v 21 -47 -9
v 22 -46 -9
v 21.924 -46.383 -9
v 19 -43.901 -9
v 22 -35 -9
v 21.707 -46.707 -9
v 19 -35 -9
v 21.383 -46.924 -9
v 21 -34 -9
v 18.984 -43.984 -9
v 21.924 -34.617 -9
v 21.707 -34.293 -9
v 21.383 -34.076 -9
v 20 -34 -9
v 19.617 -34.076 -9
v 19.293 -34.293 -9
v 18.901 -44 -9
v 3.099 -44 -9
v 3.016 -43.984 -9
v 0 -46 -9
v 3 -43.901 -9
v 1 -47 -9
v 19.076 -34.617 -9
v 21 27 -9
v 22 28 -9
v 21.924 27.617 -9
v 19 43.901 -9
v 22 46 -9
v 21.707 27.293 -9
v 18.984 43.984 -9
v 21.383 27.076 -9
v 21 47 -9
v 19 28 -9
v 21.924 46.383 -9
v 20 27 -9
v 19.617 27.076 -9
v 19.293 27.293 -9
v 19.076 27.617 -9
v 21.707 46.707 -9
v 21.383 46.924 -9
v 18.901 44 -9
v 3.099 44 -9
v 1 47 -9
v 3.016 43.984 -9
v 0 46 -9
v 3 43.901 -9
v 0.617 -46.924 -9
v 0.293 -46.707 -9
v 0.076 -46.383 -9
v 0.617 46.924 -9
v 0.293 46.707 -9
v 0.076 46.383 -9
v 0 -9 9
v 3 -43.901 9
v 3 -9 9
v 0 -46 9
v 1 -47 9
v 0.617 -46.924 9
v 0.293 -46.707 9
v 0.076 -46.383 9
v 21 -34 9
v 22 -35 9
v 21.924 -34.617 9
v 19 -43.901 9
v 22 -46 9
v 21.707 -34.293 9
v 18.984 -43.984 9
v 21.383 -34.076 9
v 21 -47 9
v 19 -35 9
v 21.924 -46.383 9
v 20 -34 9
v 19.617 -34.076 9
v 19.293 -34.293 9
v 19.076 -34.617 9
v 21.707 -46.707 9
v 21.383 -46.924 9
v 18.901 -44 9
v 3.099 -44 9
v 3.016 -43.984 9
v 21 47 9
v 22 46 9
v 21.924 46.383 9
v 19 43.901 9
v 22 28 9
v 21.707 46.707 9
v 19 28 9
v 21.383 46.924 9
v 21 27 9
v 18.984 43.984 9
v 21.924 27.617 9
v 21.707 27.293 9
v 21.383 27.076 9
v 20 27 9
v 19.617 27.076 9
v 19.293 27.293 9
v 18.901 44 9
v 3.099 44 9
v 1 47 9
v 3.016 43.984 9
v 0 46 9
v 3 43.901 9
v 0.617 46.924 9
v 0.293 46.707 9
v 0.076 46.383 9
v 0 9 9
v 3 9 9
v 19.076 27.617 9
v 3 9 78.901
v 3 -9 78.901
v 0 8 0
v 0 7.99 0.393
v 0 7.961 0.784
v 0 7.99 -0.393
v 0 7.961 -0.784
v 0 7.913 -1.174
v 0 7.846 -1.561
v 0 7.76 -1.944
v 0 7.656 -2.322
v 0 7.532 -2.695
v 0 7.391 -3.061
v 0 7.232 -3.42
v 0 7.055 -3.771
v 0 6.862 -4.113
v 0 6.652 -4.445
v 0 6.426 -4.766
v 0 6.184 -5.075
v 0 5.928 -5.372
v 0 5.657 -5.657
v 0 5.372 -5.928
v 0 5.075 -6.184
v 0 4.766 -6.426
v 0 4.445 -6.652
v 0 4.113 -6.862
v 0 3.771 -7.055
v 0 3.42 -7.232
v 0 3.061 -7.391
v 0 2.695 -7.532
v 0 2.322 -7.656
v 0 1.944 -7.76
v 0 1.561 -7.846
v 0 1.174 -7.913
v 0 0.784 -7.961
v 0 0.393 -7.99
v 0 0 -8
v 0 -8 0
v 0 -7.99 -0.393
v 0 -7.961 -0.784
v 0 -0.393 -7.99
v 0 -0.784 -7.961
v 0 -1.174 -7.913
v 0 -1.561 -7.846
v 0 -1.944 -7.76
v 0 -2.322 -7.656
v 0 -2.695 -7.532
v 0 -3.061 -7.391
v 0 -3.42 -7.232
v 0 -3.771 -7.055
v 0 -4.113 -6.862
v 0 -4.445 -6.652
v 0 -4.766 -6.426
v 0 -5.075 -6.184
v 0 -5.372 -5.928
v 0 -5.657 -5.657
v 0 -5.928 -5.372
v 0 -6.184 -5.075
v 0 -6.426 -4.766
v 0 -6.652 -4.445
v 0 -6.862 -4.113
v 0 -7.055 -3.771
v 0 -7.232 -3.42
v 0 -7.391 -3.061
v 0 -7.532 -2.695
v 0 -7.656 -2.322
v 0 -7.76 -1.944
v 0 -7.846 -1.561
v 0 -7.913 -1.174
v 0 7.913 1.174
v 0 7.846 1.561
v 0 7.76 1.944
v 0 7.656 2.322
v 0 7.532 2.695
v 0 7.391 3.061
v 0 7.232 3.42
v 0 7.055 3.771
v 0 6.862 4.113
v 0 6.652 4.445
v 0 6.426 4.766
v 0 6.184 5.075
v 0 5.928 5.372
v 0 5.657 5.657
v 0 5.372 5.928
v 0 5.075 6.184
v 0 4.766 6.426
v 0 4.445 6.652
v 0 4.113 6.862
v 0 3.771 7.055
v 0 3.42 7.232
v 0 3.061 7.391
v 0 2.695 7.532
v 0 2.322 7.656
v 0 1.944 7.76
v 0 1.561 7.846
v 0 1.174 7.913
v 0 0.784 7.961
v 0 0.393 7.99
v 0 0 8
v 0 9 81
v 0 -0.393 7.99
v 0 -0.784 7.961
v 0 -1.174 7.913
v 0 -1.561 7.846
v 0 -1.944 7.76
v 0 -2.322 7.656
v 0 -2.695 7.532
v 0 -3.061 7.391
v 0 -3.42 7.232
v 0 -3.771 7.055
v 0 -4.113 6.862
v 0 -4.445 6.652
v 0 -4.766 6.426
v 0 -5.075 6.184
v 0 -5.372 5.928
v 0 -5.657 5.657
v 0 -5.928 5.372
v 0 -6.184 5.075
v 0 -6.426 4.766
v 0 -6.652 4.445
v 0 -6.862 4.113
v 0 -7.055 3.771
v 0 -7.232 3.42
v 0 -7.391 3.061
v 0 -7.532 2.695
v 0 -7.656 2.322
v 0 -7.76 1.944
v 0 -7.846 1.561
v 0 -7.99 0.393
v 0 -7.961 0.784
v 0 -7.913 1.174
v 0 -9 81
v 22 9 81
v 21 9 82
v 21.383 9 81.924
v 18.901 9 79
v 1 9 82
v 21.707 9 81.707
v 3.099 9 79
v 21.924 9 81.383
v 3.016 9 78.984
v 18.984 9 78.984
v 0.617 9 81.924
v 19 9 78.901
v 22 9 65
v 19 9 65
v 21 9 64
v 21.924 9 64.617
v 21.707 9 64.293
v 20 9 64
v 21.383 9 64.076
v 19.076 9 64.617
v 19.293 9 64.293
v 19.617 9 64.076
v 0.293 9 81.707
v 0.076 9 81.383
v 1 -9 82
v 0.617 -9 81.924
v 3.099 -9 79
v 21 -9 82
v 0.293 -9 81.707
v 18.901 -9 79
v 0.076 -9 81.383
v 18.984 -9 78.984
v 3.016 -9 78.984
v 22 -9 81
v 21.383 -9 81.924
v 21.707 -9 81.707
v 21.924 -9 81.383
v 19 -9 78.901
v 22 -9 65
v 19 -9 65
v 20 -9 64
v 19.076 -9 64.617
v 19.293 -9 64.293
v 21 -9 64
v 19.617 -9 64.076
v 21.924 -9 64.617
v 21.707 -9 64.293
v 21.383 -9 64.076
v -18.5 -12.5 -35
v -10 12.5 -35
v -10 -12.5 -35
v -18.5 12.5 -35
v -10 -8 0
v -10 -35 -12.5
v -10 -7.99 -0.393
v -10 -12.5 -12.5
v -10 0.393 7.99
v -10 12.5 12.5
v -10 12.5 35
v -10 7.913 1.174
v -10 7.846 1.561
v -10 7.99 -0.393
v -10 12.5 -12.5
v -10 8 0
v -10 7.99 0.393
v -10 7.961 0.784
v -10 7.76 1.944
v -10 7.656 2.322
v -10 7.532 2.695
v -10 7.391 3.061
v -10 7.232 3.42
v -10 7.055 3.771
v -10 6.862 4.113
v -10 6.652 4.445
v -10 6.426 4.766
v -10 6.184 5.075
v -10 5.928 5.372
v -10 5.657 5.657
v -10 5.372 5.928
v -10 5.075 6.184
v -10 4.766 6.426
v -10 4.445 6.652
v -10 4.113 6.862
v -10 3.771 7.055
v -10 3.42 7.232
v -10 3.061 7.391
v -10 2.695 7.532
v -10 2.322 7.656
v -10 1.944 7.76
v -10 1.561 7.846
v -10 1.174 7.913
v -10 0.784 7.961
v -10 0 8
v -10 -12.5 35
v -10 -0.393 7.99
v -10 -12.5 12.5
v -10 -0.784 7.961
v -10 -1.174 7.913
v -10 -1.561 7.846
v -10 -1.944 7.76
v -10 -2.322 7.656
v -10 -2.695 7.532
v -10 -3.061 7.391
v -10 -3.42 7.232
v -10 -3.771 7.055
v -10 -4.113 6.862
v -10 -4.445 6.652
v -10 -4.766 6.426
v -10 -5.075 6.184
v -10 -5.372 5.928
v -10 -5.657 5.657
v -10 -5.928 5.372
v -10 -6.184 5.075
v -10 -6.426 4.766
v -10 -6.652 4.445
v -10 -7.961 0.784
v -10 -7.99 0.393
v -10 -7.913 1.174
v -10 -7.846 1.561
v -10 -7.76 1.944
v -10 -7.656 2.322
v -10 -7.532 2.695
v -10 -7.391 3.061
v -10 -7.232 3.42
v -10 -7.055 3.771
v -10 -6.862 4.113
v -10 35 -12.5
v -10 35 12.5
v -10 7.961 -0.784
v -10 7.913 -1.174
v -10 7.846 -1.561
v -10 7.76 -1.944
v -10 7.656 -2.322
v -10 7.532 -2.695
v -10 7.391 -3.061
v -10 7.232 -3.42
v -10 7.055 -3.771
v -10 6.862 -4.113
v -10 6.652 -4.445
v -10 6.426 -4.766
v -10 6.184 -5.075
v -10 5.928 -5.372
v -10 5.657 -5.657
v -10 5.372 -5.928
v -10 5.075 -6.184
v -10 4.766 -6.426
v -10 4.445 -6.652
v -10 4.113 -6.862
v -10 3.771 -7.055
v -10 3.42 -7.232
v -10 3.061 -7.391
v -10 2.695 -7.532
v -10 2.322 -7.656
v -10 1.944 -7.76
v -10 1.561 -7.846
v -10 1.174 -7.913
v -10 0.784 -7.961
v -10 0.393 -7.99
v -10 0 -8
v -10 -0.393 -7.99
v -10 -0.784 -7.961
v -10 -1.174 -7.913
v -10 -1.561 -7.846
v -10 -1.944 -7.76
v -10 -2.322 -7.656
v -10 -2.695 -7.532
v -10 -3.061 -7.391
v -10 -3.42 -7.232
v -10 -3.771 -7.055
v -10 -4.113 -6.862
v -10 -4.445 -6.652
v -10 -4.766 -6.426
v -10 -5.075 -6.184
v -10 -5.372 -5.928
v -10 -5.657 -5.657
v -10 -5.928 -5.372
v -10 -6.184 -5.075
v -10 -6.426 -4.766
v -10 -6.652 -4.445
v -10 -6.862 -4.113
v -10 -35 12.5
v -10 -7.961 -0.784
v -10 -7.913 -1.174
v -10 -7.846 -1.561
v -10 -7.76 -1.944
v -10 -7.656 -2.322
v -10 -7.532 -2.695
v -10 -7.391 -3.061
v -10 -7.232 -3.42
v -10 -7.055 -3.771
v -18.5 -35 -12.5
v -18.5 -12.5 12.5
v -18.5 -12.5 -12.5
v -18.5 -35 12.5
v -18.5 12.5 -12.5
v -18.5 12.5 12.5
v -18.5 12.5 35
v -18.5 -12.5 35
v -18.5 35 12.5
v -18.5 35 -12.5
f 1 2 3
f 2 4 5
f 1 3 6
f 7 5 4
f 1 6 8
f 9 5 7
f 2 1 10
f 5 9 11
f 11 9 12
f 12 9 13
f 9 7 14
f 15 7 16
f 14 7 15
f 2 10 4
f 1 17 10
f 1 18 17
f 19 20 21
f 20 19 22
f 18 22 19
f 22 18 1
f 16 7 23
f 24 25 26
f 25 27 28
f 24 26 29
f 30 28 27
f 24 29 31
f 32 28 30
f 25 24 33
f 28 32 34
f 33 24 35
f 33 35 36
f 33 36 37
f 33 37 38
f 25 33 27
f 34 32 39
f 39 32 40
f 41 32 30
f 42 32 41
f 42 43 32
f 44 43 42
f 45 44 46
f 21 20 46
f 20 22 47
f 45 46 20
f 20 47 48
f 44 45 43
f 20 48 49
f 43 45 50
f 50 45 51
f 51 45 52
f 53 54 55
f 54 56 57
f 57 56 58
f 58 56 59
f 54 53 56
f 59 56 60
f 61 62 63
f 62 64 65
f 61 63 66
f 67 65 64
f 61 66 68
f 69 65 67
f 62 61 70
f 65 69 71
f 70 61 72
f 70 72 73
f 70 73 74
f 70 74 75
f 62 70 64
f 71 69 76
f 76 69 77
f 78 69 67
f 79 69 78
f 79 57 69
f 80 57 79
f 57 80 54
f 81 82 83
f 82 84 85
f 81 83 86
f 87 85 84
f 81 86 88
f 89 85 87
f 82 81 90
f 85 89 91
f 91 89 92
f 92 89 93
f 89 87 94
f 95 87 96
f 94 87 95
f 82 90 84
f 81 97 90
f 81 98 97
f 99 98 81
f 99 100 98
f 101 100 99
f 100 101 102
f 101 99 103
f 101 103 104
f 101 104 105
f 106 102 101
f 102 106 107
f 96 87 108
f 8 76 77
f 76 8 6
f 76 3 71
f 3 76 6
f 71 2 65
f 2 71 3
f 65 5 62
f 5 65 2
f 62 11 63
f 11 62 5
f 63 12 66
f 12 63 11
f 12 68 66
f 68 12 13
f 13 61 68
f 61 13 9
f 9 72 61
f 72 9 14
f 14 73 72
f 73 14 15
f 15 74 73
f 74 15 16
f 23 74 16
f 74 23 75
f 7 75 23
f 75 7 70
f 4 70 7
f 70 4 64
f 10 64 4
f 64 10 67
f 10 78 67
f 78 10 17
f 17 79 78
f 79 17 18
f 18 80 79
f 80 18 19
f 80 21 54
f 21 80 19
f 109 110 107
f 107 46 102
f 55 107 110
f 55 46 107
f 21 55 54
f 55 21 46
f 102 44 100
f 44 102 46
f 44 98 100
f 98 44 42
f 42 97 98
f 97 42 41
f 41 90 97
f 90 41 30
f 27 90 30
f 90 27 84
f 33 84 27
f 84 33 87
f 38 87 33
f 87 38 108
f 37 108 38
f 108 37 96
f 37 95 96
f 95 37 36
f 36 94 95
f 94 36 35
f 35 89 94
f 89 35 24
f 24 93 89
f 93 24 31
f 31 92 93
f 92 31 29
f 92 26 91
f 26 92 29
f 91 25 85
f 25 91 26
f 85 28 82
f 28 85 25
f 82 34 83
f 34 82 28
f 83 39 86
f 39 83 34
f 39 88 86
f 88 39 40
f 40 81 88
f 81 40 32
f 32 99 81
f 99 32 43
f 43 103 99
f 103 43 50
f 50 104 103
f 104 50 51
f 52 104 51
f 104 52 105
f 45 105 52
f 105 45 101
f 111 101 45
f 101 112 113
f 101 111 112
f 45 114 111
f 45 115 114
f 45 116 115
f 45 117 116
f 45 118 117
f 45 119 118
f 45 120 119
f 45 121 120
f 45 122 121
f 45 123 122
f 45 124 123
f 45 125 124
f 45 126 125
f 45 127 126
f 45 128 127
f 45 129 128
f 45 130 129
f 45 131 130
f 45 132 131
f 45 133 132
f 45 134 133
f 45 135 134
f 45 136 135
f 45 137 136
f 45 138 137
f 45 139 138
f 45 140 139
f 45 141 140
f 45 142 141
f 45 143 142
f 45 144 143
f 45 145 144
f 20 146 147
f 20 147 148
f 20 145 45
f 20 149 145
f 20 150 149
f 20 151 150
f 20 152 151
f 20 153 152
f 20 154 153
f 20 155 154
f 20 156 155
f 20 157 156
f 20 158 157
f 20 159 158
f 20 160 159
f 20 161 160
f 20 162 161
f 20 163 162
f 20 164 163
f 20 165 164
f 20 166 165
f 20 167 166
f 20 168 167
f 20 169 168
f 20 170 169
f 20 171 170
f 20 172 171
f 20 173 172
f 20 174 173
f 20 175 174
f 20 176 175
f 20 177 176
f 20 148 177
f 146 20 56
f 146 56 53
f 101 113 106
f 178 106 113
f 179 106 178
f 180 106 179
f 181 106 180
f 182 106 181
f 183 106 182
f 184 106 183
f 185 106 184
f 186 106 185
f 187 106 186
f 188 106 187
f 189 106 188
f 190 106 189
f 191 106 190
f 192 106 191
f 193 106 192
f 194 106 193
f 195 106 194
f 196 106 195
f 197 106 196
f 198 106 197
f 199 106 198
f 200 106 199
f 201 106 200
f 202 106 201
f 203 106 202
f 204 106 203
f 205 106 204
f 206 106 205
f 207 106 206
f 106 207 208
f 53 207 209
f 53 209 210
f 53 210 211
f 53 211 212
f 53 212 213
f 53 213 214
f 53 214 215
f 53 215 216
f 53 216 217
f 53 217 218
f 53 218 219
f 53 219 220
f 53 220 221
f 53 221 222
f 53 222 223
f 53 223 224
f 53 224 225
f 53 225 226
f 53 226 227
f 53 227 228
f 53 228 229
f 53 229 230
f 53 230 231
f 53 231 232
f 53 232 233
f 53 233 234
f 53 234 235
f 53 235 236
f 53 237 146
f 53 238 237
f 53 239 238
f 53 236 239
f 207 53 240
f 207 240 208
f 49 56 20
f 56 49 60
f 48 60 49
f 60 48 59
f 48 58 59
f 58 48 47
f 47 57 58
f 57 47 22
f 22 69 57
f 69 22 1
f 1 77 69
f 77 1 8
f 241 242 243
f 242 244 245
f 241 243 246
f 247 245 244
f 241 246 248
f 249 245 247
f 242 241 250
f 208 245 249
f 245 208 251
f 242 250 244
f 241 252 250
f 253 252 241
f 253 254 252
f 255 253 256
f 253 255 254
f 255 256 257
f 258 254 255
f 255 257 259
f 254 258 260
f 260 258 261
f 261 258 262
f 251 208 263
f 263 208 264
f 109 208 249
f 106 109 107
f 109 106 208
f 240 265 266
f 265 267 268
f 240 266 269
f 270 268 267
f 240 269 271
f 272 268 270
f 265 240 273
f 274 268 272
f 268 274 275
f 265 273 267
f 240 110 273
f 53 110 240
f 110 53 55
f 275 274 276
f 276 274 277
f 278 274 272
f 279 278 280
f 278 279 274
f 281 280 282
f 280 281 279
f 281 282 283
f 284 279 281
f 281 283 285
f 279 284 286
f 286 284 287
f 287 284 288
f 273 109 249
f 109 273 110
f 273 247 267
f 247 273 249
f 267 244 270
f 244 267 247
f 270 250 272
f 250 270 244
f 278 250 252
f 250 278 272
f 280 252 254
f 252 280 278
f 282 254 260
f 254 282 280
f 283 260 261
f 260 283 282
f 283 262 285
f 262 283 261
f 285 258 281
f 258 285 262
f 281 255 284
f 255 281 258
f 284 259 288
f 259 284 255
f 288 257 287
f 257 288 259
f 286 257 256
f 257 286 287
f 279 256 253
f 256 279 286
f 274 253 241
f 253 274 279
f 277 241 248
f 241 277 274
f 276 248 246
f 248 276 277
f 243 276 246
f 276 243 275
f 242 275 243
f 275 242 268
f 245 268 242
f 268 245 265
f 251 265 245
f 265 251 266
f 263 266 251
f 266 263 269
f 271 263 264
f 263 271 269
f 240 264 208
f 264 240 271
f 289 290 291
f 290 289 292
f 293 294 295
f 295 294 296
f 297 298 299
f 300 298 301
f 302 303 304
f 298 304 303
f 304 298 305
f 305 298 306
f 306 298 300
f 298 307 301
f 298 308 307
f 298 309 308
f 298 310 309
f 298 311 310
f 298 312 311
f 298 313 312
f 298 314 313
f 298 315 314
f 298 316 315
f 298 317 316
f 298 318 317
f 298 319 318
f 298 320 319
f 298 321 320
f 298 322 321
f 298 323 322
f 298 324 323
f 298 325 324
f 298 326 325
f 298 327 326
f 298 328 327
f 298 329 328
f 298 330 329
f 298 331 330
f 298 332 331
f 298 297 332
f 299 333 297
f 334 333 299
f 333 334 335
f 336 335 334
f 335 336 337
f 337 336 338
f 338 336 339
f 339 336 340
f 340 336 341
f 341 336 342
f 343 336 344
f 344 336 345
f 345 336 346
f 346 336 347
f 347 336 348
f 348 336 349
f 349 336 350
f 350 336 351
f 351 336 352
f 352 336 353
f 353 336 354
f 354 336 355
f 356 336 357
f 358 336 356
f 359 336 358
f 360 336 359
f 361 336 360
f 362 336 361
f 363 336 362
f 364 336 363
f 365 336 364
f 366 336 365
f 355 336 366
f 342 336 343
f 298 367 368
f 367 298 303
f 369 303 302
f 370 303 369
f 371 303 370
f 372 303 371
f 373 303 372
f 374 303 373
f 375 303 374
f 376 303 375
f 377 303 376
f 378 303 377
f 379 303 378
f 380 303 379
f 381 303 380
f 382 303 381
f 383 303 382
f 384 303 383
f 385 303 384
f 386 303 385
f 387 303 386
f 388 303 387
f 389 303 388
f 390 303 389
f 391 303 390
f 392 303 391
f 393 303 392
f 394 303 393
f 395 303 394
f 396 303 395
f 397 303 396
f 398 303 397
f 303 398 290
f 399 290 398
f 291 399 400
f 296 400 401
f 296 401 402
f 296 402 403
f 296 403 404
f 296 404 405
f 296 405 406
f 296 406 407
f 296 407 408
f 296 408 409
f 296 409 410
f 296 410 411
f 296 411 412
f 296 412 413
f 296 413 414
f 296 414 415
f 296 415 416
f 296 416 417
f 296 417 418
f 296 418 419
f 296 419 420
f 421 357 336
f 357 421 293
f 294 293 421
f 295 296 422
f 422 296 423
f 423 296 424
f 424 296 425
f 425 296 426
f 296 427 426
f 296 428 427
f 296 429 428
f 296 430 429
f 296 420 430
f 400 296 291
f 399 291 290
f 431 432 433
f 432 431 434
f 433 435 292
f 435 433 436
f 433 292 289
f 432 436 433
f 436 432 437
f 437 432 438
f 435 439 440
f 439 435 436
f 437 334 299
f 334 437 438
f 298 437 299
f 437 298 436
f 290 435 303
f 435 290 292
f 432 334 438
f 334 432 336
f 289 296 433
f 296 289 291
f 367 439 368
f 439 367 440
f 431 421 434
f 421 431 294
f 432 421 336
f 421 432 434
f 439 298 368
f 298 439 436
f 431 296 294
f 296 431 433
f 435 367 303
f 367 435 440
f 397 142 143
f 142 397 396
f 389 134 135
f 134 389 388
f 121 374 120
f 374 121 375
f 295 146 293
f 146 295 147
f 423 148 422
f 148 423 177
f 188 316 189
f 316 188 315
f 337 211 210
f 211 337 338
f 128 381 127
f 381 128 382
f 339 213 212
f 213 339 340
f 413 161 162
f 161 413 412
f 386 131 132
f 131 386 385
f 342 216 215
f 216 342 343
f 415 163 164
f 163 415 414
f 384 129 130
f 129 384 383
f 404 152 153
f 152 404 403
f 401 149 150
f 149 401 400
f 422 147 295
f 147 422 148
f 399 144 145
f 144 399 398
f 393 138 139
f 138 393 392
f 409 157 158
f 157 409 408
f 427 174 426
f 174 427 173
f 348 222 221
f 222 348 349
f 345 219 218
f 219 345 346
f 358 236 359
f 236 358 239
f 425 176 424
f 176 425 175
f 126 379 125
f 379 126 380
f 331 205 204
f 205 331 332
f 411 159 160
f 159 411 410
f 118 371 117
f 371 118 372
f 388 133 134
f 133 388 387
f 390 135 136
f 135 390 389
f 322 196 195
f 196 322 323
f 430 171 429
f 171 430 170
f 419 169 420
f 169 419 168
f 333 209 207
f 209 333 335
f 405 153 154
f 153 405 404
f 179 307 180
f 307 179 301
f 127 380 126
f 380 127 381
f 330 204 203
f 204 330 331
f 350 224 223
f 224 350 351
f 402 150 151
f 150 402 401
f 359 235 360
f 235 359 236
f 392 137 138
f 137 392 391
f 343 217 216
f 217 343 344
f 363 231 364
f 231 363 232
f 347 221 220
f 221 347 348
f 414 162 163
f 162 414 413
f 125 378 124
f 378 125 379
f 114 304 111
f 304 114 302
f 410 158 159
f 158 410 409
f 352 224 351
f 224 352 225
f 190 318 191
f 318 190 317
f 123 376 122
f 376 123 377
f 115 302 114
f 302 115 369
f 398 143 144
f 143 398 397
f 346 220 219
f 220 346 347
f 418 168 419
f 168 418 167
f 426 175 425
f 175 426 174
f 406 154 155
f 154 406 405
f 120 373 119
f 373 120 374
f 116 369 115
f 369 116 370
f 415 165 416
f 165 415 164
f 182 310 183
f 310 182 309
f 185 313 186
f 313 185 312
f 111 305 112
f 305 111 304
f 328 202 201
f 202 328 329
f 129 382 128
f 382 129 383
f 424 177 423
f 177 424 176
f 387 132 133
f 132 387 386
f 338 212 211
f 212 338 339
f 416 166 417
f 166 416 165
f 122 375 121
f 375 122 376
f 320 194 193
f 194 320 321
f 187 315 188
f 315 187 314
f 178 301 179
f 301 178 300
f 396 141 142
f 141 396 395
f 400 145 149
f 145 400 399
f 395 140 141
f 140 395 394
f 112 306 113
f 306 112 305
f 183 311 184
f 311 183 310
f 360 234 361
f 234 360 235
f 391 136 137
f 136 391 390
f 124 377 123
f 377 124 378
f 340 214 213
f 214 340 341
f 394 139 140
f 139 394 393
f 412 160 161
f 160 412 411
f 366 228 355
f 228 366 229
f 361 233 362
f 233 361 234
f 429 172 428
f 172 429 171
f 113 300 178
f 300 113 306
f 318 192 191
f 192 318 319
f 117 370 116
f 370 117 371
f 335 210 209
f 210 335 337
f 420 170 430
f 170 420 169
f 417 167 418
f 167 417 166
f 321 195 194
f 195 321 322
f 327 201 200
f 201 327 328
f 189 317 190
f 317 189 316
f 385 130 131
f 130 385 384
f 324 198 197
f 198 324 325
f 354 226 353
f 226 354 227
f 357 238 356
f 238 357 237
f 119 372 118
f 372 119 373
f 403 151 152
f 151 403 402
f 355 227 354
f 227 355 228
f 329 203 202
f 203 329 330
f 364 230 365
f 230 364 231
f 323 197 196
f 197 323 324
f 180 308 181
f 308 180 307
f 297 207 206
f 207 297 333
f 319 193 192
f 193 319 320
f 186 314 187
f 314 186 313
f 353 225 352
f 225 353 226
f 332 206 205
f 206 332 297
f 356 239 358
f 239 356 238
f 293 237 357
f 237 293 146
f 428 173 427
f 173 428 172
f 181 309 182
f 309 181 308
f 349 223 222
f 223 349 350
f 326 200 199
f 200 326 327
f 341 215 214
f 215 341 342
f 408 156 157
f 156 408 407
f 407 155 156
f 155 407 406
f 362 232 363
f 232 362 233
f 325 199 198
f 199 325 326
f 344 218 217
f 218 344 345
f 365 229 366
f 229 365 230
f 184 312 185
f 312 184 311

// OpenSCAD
// file: A2D.scad
// Wrapper entrypoint for A2D (doc-friendly: include <A2D.scad>)
include <A2D/A2D.scad>;
// main file
// Animace
$vpt = [0, 0, 0]; // Kam se hledí
// $vpr = [270, 0, 270]; // Úhel kamery
// $t = 0.0-1.0; // Čas
$vpd = 500; // Vzdálenost od objektu
//$t = 0.0;  => $vpr = [270, 0, 270];
//$t = 0.25; => $vpr = [220, 0, 180];
//$t = 0.5;  => $vpr = [270, 0,  90];
//$t = 0.75; => $vpr = [320, 0,   0];
//$t = 1.0;  => $vpr = [270, 0, -90];
//$t = 0.5;
//$vpr = [270, 0, 360*$t-90];
$vpr = [270-50*sin($t*360), 0, 270-$t*4*90];




include <A2D.scad>;

// Rozměry pro mobil (pro držák, aby se do něj vešel)
mobilTloustka = 16;
mobilSirka = 88;
mobilVyskaPul = 88; // odspoda k prvnímu tlačítku

// Rozměry přesahů u držáku
paclikSirka = 18;
paclikPresahPravy = 10; // Tam co jsou tlačítka
paclikPresahLevy = 17; // Tam co je tužka
paclikPresahDolni = 15; // Tam co je tužka
paclikTloustka = 3;
// Cnější a vnitřní zaoblení držákové části
ro=1.0;
ri=0.0;

// Deska (křížek +) pro přichycení na selfie tyč
deskaVyska = 70;
deskaSirka = 25;
deskaTloustka = 8.5;

// Spojnice mezi deskou (křížkem) a držákem mobilu
spojD = 16;
spojH = 10;

// Držáková část pro uchycení mobilu
module Drzak()
{
    linear_extrude(paclikSirka, center=true) {
        make_round(ro=ro, ri=ri, $fn=16) 
        polygon([
            [0,0], // 1
            [2*paclikTloustka+mobilTloustka, 0], // 2
            [2*paclikTloustka+mobilTloustka, paclikTloustka+paclikPresahPravy], //3
            [paclikTloustka+mobilTloustka, paclikTloustka+paclikPresahPravy], // 4
            [paclikTloustka+mobilTloustka, paclikTloustka], // 5
            [paclikTloustka, paclikTloustka], // 6
            [paclikTloustka, paclikTloustka+mobilSirka], // 7
            [paclikTloustka+mobilTloustka, paclikTloustka+mobilSirka], // 8
            [paclikTloustka+mobilTloustka, paclikTloustka+mobilSirka-paclikPresahLevy], // 9
            [2*paclikTloustka+mobilTloustka, paclikTloustka+mobilSirka-paclikPresahLevy], // 10
            [2*paclikTloustka+mobilTloustka, 2*paclikTloustka+mobilSirka], // 11
            [0, 2*paclikTloustka+mobilSirka], // 12
        ]);
    }
    translate([0,(mobilSirka+2*paclikTloustka)/2,-paclikSirka/2])
    rotate([90,0,0])
    linear_extrude(paclikSirka, center=true) {
        make_round(ro=ro, ri=ri, $fn=16) 
        polygon([
            [0,0], // 1
            [paclikTloustka, 0], // 2
            [paclikTloustka, mobilVyskaPul], // 3
            [paclikTloustka+mobilTloustka, mobilVyskaPul], // 4
            [paclikTloustka+mobilTloustka, mobilVyskaPul-paclikPresahDolni], // 5
            [2*paclikTloustka+mobilTloustka, mobilVyskaPul-paclikPresahDolni], // 6
            [2*paclikTloustka+mobilTloustka, mobilVyskaPul+paclikTloustka], // 7
            [0, mobilVyskaPul+paclikTloustka], // 8
        ]);
    }
}

// Zadní deska (křížek) pro uchycení do selfie tyče
module Deska()
{
    translate([-deskaTloustka/2-spojH,(mobilSirka+2*paclikTloustka)/2,0])
    rotate([0,90,0])
    {
        cube([deskaVyska,deskaSirka,deskaTloustka], center=true);
        rotate([0,0,90])
        cube([deskaVyska,deskaSirka,deskaTloustka], center=true);
    }
}

// Spojnice desky a držáku
module Spoj()
{
    translate([-spojH,(mobilSirka+2*paclikTloustka)/2,0])
    rotate([0,90,0])
    cylinder(spojH, d=spojD, $fn=128);
}

// Výkres
translate([0,-mobilSirka/2-paclikTloustka,0]) {
    Drzak();
    Deska();
    Spoj();
}
